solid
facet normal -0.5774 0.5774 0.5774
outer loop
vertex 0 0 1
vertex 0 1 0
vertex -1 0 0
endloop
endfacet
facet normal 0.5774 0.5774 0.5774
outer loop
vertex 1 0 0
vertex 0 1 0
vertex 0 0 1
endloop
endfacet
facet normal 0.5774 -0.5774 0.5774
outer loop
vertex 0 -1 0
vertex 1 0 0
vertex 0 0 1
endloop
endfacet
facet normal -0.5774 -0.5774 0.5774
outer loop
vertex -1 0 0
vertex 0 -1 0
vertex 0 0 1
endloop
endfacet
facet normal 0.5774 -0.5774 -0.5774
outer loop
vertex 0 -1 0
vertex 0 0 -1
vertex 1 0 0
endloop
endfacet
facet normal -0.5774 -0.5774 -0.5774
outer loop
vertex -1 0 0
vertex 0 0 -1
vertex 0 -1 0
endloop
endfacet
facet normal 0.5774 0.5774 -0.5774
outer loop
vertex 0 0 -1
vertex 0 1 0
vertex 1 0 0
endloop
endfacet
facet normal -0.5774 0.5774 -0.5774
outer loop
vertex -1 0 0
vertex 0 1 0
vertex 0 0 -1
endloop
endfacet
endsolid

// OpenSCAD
//array of 3D points of our convex hull
my_points = [[0,0,1], [0,0,-1], [0,1,0], [0,-1,0], [1,0,0], [-1,0,0]];

//convex hull (by points in polyhedron)
//[[0,1,2,3,4,5]] - is array of faces - one face with six points 
hull()
    polyhedron(my_points, [[0,1,2,3,4,5]]);
